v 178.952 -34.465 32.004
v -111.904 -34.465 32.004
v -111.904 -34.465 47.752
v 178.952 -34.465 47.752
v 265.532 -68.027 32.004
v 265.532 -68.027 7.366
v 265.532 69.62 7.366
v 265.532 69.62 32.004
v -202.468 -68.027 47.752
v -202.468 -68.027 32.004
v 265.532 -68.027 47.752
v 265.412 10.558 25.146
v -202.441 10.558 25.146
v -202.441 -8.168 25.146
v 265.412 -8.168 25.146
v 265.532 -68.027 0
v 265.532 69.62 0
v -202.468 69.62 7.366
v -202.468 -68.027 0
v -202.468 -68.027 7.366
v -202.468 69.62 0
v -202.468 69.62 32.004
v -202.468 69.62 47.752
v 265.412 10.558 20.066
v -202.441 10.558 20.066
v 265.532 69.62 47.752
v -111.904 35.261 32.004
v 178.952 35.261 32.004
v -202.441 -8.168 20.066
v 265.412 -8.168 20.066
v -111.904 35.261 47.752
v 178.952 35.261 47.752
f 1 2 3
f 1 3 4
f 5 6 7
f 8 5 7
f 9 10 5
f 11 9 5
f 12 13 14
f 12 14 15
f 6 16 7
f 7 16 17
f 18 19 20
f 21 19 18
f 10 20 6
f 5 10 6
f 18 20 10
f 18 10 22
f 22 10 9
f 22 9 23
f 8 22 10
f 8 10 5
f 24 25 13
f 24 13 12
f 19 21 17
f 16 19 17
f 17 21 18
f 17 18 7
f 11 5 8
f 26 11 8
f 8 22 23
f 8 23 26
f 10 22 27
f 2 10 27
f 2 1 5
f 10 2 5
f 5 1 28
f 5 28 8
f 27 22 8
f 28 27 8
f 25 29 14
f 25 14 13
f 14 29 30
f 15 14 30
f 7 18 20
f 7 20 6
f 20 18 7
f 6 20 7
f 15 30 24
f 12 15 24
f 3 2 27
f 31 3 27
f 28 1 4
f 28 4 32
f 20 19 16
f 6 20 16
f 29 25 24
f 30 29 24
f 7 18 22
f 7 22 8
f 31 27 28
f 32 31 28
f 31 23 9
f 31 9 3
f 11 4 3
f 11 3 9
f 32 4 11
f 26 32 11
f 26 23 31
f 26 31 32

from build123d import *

# Parameters (mm, degrees)
F0_W     = 468.0004864931
F0_H     = 137.6467421651
F1_DEPTH = 7.366
F3_W     = 467.8527712822
F3_H     = 18.726343289
F4_DEPTH = 5.08
F5_W     = 468.0004864931
F5_H     = 137.6467421651
F6_DEPTH = 24.638
F7_W     = 468.0004864931
F7_H     = 137.6467421651
F7_W_2   = 290.8559888601
F7_H_2   = 69.7257481515
F8_DEPTH = 15.748


with BuildPart() as f1:
    # F0 (on Top) → F1 (new body)
    with BuildSketch(Plane.XY):
        with Locations((31.531855464, 0.7967613637)):
            Rectangle(F0_W, F0_H)
    extrude(amount=F1_DEPTH)


with BuildPart() as f4:
    # F3 (on offset) → F4 (new body)
    with BuildSketch(Plane.XY.offset(20.066)):
        with Locations((31.4855575562, 1.195197925)):
            Rectangle(F3_W, F3_H)
    extrude(amount=F4_DEPTH)


with BuildPart() as f6:
    # F5 (on face) → F6 (new body)
    with BuildSketch(Plane.XY.offset(7.366)):
        with Locations((31.531855464, 0.7967613637)):
            Rectangle(F5_W, F5_H)
    extrude(amount=F6_DEPTH)


with BuildPart() as f8:
    # F7 (on face) → F8 (new body)
    with BuildSketch(Plane.XY.offset(32.004)):
        with Locations((31.531855464, 0.7967613637)):
            Rectangle(F7_W, F7_H)
        with Locations((33.5240289569, 0.3983322531)):
            Rectangle(F7_W_2, F7_H_2, mode=Mode.SUBTRACT)
    extrude(amount=F8_DEPTH)


solid = Compound([f1.part, f4.part, f6.part, f8.part])
